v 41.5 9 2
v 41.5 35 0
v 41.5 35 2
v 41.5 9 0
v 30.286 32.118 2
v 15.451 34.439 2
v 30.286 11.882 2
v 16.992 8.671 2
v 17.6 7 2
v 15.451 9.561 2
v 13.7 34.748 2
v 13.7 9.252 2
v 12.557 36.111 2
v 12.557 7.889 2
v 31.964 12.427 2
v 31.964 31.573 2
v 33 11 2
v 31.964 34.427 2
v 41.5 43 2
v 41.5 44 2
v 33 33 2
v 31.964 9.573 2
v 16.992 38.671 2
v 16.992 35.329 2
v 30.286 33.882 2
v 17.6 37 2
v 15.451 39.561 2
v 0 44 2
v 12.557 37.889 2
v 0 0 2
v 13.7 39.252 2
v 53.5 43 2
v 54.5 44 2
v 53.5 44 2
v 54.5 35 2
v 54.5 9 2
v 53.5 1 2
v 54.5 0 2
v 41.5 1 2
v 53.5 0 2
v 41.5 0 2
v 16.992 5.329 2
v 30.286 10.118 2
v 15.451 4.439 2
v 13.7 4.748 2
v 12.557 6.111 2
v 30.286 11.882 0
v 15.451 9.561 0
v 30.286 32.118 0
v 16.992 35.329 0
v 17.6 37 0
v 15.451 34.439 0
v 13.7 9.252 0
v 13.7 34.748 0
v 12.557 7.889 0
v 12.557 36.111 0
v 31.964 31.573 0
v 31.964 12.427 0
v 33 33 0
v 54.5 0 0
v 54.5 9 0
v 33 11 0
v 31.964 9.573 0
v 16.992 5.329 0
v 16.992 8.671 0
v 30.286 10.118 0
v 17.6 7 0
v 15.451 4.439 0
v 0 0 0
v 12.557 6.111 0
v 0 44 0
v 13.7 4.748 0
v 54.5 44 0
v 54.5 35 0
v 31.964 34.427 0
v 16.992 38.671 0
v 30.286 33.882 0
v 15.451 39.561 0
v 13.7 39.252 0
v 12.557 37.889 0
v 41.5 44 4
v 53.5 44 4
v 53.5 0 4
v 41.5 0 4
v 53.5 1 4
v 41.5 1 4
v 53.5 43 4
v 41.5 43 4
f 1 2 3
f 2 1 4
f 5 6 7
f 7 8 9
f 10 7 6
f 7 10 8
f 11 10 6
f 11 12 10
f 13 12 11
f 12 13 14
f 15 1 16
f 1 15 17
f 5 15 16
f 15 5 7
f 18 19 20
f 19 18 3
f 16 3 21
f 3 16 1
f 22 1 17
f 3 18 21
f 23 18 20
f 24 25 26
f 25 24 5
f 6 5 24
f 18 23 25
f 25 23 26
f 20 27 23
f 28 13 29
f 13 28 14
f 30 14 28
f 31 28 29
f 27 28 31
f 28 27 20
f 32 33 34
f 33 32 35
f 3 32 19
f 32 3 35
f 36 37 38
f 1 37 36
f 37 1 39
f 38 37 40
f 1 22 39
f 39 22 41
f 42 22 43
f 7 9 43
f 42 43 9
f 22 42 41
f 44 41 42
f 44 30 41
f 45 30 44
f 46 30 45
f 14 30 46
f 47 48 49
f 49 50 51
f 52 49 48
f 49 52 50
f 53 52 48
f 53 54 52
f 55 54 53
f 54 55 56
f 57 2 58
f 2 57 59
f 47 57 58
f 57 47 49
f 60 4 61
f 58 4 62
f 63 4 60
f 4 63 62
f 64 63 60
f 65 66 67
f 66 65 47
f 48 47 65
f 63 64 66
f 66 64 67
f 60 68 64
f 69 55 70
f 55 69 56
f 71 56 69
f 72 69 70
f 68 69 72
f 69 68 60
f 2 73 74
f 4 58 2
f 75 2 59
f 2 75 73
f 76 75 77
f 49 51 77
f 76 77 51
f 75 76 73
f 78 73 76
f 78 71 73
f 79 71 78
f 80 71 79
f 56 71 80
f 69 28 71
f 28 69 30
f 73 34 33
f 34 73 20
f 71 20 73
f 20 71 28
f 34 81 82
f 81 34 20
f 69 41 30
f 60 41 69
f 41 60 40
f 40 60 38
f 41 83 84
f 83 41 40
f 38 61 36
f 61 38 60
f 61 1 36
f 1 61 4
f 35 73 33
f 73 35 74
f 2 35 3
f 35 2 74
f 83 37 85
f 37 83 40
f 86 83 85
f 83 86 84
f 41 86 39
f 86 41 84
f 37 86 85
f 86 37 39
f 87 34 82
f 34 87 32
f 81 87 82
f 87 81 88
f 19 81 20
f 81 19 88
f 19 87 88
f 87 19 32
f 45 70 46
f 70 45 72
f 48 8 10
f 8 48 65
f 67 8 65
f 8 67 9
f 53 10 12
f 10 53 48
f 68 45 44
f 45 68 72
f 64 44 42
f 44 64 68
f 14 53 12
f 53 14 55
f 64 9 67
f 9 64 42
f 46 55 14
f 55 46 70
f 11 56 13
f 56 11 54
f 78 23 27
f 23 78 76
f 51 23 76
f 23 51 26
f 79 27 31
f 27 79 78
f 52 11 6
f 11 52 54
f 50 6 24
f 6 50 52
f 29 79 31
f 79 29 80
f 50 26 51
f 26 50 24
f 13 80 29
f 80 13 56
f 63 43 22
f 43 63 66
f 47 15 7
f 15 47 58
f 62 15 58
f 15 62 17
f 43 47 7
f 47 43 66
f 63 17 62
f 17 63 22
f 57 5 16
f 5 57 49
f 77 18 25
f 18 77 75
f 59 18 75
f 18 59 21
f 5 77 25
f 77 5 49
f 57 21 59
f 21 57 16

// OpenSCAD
// file: ../project_vars.scad
// Copyright (c) 2021 Michael Messmore

// All units in mm

// basic rack-mount variables
r_unit = 44;
r_screw_r = 2.6;
r_screw_delta = 30;
r_screw_v_offset = 7;
r_screw_h_offset = 15;
r_screw_wide_centers = 270;
r_plate_to_plate = 190;
r_total_width = (r_screw_h_offset * 2) + r_screw_wide_centers;
m3_r = 3 / 2;

// project variables
thickness = 2;
// main file
// Copyright (c) 2021 Michael Messmore

include <../project_vars.scad>

// total panel
panel_width = 255;
panel_height = 57;

// actual panel of plugs
plug_panel_from_side = 19;
plug_panel_height = 26;

// notch
notch_from_side = 20;
notch_width = 12;

// main bracket
fake_hole_offset=-5;
fake_hole_height=10;
main_bracket_width = ((r_total_width - panel_width) / 2) + plug_panel_from_side;

// extension around panel
bracket_extension_width = ((r_total_width - panel_width) / 2) + notch_from_side + notch_width;
bracket_extension_height = (r_unit - plug_panel_height) / 2;

// m3 screw offsets
m3_h_offset = main_bracket_width - 10;
// 1/4 up
m3_v1_offset = r_unit / 4;
// 3/4 up
m3_v2_offset = (r_unit / 4) * 3;

difference() {
    // main plastic
    union() {
        cube([main_bracket_width, r_unit, thickness]);
        cube([bracket_extension_width, bracket_extension_height, thickness]);
        translate([0, r_unit - bracket_extension_height, 0])
            cube([bracket_extension_width, bracket_extension_height, thickness]);
        translate([main_bracket_width, 0, 0])
            color("#FF0000") cube([notch_width, 1, 4]);
        translate([main_bracket_width, r_unit - 1, 0])
            color("#00FF00") cube([notch_width, 1, 4]);
    }
    // rack screw holes
    translate([r_screw_h_offset, r_screw_v_offset, fake_hole_offset])
        cylinder(fake_hole_height, r_screw_r, r_screw_r);
    translate([r_screw_h_offset, r_screw_v_offset + r_screw_delta, fake_hole_offset])
        cylinder(fake_hole_height, r_screw_r, r_screw_r);

    // m3 screw holes
    translate([m3_h_offset, m3_v1_offset, fake_hole_offset])
        cylinder(fake_hole_height, m3_r, m3_r);
    translate([m3_h_offset, m3_v2_offset, fake_hole_offset])
        cylinder(fake_hole_height, m3_r, m3_r);
}
